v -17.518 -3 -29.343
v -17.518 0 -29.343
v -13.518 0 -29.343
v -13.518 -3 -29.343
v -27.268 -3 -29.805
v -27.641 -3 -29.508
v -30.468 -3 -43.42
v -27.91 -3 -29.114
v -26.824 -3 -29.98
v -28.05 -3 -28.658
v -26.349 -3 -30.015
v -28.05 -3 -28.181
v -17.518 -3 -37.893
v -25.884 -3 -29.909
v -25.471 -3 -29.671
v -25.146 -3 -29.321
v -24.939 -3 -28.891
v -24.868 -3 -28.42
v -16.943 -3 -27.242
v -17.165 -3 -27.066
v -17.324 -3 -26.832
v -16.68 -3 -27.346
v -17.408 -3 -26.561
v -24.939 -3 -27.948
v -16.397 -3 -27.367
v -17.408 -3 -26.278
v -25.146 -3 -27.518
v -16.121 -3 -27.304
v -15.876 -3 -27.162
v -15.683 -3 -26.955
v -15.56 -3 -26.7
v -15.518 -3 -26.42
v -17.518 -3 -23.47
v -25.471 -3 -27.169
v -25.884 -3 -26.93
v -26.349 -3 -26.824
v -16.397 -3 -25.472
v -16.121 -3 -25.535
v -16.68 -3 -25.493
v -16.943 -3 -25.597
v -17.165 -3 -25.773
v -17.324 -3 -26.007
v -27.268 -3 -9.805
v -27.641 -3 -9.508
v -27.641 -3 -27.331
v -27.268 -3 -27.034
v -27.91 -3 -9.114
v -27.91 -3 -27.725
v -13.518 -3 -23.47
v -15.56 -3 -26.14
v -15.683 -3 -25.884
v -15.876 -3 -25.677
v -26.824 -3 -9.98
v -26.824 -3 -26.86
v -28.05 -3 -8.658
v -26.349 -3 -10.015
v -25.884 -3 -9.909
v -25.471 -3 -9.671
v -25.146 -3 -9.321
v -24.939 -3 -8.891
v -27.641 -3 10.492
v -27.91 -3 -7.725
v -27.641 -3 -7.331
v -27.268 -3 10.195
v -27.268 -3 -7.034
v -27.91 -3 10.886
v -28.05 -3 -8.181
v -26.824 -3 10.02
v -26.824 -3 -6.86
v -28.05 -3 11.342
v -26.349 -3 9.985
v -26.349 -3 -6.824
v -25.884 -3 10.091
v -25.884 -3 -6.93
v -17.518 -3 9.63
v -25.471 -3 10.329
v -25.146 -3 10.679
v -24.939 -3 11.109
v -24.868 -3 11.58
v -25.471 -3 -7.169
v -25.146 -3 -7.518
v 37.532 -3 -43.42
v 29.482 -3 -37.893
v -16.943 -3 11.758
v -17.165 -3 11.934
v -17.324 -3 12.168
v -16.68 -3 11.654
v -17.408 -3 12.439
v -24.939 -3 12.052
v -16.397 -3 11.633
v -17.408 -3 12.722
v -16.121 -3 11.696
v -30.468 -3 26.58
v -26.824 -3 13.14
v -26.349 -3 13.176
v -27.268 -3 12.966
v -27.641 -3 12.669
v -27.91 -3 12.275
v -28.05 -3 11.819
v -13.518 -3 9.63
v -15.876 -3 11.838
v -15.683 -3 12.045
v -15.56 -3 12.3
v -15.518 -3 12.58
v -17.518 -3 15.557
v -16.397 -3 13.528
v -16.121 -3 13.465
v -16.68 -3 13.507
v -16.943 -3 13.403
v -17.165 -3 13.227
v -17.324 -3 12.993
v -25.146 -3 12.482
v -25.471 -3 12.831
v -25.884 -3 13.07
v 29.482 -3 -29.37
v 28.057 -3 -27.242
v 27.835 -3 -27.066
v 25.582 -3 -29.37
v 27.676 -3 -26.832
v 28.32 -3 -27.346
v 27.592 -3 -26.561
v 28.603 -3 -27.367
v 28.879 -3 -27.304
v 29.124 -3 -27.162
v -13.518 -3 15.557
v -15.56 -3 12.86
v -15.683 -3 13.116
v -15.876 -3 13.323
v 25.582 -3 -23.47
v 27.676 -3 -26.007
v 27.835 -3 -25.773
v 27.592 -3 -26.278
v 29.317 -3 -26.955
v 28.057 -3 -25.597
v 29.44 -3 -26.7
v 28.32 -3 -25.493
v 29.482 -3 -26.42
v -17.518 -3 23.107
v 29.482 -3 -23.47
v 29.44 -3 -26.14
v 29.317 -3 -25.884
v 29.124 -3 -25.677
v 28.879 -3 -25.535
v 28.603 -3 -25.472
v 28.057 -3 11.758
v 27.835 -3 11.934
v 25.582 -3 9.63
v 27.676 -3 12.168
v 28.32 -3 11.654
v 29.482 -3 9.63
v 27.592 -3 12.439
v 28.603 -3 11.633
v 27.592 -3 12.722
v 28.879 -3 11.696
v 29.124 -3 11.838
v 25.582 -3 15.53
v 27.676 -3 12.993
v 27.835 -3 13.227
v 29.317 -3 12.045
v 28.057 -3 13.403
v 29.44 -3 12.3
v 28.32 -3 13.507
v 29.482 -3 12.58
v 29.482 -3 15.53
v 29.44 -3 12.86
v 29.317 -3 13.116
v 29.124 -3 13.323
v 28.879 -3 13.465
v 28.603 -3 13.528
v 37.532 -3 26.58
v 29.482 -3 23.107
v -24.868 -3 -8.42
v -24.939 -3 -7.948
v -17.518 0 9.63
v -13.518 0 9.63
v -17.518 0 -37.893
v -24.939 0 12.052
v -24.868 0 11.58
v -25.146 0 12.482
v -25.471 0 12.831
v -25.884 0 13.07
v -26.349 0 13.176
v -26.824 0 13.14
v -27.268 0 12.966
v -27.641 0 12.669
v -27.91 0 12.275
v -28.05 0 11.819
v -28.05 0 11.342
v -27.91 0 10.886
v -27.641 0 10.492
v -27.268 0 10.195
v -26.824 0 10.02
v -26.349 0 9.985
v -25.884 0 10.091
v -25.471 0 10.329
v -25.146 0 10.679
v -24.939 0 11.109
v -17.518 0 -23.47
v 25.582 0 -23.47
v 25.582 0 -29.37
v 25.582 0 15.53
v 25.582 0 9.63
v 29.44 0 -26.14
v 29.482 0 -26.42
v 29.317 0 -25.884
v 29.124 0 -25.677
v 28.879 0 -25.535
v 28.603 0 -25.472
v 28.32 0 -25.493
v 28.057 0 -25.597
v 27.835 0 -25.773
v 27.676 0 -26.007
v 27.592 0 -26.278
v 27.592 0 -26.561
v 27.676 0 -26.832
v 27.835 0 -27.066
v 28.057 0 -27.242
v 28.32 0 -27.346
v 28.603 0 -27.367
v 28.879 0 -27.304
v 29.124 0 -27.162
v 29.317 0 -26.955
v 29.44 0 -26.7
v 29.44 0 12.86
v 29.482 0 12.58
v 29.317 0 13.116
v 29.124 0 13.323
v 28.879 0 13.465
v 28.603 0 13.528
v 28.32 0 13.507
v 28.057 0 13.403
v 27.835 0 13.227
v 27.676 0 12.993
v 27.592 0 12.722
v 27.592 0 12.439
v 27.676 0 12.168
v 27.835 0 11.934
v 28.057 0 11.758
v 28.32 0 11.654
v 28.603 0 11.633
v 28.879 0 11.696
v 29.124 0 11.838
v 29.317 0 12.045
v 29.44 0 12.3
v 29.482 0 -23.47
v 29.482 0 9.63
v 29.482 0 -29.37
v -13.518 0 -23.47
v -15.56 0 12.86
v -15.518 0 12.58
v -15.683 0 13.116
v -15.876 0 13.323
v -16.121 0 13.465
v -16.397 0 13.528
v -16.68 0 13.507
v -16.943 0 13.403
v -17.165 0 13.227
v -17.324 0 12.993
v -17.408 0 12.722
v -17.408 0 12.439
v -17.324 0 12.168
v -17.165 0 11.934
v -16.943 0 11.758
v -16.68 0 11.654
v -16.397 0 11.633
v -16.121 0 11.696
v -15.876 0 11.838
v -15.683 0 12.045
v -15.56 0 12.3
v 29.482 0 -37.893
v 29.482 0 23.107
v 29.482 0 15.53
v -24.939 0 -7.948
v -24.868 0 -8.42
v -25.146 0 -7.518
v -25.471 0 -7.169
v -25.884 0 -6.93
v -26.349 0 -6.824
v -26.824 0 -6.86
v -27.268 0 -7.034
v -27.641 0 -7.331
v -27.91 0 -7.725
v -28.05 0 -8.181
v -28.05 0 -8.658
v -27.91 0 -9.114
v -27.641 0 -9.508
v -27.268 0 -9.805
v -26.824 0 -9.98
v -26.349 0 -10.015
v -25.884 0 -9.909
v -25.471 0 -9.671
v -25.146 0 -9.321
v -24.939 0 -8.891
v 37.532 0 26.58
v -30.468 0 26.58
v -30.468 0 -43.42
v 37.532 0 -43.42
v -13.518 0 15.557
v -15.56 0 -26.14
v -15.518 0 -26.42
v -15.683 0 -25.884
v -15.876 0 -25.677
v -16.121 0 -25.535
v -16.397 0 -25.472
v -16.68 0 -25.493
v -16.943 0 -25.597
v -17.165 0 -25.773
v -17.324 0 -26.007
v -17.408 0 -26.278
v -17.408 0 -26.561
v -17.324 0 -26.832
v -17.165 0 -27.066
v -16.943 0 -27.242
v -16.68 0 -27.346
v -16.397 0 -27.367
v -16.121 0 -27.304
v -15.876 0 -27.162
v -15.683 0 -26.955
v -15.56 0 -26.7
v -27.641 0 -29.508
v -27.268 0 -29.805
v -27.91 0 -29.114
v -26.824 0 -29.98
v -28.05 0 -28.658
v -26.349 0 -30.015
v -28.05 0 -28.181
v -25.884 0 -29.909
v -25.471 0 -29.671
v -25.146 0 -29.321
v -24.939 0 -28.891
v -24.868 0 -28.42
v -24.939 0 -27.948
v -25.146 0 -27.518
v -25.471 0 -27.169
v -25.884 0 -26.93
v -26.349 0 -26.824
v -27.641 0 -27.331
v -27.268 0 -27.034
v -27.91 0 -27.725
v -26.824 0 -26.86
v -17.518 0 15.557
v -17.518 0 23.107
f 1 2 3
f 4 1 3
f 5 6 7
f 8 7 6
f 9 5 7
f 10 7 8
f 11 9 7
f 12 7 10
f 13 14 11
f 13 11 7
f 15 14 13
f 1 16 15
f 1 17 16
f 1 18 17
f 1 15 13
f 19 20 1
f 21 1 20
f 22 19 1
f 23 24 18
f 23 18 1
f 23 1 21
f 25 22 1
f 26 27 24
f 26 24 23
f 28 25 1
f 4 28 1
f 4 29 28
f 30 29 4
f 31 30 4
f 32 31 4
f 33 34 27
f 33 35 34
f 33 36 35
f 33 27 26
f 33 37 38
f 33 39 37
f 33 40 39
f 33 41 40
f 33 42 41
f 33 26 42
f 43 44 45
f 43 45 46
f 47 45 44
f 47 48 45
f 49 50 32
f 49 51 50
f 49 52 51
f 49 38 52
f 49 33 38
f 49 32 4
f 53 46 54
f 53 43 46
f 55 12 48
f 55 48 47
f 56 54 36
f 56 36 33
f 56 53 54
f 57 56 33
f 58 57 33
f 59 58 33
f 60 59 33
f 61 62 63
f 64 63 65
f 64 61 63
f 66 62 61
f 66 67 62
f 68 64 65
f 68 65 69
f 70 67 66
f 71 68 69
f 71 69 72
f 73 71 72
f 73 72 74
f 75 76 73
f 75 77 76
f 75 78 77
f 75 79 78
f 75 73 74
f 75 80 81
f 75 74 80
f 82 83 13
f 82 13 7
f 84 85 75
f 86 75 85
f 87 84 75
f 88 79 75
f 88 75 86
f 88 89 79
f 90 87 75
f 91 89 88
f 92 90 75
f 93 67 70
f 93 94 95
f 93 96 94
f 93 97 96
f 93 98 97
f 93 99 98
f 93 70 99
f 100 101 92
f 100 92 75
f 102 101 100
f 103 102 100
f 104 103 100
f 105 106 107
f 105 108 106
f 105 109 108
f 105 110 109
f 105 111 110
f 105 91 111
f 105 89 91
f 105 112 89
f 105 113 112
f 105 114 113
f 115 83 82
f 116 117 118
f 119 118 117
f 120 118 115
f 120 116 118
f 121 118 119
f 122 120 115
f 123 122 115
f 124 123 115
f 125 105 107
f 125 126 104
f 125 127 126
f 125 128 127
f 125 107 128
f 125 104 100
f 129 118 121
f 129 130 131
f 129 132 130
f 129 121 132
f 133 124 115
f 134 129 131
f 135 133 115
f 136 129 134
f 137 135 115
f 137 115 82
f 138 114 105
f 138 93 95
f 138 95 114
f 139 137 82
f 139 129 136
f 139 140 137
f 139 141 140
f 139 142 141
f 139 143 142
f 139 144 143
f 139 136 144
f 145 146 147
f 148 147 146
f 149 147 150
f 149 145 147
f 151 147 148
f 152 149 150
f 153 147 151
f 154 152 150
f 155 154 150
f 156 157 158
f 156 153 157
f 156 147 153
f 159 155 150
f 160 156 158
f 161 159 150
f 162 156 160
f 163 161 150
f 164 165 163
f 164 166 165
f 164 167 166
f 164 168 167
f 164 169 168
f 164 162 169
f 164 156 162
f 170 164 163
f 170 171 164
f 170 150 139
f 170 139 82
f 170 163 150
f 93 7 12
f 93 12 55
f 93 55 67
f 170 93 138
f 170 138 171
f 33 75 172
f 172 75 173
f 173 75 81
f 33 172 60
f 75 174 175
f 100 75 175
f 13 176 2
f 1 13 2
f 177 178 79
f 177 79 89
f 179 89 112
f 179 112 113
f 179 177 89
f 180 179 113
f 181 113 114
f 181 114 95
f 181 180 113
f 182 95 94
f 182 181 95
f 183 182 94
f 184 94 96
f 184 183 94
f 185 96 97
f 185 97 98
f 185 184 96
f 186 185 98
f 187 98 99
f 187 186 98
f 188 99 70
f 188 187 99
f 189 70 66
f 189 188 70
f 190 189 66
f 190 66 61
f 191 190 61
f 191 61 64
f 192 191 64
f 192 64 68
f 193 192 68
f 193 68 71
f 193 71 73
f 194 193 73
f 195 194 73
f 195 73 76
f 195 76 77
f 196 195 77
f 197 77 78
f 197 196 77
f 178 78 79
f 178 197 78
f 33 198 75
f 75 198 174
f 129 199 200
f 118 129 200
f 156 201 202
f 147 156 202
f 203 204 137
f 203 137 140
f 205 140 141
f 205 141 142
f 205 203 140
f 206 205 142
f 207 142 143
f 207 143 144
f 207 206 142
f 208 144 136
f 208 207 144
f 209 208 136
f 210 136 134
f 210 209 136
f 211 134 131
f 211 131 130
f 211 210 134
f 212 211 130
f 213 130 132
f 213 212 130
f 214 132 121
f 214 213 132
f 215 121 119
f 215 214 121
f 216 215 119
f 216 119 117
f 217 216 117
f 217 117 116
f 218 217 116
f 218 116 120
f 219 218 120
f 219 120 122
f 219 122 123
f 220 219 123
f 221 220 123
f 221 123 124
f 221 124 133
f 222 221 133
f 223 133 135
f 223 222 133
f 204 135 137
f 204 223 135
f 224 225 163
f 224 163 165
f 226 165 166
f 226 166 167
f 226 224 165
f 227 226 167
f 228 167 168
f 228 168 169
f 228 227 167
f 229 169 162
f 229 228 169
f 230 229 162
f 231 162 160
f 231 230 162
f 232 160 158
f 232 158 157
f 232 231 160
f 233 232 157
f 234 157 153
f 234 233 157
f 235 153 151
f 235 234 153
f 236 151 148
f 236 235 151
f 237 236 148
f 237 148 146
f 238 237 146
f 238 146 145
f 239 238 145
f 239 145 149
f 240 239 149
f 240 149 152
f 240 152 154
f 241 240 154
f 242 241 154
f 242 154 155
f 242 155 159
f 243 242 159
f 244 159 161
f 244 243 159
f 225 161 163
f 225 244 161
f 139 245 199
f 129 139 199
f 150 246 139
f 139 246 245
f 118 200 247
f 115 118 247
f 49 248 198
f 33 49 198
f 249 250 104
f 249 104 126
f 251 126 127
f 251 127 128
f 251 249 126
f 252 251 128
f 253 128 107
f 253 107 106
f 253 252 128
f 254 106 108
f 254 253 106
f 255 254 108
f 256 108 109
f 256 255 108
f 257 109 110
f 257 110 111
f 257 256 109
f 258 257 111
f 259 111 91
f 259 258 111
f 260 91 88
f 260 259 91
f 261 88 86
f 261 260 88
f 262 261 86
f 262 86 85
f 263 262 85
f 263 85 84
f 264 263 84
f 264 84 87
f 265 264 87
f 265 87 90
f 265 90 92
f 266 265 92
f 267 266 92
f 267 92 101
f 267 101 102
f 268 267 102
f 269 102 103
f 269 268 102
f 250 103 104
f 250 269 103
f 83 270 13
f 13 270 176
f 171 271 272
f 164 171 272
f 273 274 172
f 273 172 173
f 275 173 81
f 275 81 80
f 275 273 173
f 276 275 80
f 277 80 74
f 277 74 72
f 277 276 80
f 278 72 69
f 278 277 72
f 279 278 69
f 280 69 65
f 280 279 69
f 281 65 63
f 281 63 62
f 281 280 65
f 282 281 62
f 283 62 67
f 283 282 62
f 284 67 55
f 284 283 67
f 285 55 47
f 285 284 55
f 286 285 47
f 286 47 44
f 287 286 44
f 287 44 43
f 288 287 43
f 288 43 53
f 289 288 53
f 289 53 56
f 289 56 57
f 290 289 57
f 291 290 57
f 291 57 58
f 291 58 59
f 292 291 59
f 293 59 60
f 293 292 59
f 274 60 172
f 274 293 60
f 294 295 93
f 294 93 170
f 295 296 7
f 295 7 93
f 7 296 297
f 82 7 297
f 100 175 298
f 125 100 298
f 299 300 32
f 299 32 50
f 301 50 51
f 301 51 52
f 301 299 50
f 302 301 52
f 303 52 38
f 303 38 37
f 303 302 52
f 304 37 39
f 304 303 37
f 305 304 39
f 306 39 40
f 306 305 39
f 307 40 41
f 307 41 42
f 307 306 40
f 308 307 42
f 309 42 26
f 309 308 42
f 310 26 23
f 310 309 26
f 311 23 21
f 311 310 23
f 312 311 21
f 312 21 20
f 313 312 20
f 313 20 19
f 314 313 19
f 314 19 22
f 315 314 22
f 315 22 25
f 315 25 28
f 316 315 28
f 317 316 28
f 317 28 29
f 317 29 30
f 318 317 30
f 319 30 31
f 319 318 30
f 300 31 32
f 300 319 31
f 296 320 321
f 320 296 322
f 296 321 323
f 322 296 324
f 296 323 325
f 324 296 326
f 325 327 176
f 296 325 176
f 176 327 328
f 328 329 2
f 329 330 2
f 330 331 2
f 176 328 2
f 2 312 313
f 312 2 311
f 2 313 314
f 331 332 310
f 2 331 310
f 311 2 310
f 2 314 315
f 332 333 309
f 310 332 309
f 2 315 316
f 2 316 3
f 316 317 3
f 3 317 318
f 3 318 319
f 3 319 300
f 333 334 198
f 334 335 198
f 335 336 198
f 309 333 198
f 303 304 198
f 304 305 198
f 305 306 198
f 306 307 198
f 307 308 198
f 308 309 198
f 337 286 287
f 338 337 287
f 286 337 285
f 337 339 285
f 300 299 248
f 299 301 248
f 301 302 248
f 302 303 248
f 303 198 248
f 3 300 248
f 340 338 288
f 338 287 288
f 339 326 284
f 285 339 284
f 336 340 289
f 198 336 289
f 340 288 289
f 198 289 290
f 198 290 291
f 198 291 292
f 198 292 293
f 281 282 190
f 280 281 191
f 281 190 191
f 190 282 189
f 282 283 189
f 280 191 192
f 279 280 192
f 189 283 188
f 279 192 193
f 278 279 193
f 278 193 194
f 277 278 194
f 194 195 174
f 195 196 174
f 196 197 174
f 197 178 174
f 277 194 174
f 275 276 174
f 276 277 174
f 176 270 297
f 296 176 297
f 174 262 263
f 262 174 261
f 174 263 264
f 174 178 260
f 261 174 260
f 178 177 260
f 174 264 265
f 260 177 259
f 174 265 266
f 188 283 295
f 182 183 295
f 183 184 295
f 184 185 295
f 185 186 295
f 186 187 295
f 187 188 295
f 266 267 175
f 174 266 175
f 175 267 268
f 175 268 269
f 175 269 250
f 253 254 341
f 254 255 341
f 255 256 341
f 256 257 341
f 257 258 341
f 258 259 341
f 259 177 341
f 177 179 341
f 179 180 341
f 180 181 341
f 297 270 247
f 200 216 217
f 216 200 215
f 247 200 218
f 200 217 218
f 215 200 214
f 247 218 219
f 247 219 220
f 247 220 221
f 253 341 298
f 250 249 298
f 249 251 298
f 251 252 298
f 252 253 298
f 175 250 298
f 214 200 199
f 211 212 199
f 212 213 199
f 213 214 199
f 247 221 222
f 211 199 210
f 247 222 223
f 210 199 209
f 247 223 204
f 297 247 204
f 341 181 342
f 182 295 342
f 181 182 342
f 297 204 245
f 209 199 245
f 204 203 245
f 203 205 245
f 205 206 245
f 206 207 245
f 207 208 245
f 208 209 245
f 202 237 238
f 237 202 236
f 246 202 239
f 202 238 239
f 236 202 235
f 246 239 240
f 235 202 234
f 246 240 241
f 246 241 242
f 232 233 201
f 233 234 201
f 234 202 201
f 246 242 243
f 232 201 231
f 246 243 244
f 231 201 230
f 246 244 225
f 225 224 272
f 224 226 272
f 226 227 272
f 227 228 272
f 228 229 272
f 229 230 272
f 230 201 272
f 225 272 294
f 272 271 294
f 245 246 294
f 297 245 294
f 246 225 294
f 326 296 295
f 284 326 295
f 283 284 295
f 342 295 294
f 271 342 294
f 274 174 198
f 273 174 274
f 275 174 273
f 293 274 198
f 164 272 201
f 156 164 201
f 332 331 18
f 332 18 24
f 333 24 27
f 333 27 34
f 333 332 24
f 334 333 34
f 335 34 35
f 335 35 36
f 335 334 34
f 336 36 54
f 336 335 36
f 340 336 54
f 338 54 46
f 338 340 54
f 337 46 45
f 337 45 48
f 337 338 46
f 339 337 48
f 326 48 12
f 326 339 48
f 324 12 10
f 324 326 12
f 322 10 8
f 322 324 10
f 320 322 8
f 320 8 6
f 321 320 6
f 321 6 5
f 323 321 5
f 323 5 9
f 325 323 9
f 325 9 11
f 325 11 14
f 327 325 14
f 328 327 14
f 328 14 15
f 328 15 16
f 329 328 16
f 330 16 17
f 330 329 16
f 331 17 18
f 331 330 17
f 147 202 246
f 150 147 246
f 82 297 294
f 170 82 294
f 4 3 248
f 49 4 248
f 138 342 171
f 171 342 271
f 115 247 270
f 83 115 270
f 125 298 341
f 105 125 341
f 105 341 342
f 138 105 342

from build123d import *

# Parameters (mm, degrees)
F0_W     = 68
F0_H     = 70
F0_R     = 1.6
F0_R_2   = 0.95
F1_DEPTH = 3


with BuildPart() as f1:
    # F0 (on Front) → F1 (new body)
    with BuildSketch(Plane.XZ):
        with Locations((3.531757, -8.419635)):
            Rectangle(F0_W, F0_H)
        with Locations((-26.468243, -28.419635)):
            Circle(F0_R, mode=Mode.SUBTRACT)
        with Locations((-16.468243, -26.419635)):
            Circle(F0_R_2, mode=Mode.SUBTRACT)
        with Locations((28.531757, -26.419635)):
            Circle(F0_R_2, mode=Mode.SUBTRACT)
        with Locations((-26.468243, -8.419635)):
            Circle(F0_R, mode=Mode.SUBTRACT)
        with Locations((-26.468243, 11.580365)):
            Circle(F0_R, mode=Mode.SUBTRACT)
        with Locations((-16.468243, 12.580365)):
            Circle(F0_R_2, mode=Mode.SUBTRACT)
        Polygon((-17.518243, 15.556515), (-17.518243, 23.106515), (29.481757, 23.106515), (29.481757, 15.530365), (25.581757, 15.530365), (25.581757, 9.630365), (29.481757, 9.630365), (29.481757, -23.469635), (25.581757, -23.469635), (25.581757, -29.369635), (29.481757, -29.369635), (29.481757, -37.893485), (-17.518243, -37.893485), (-17.518243, -29.343485), (-13.518243, -29.343485), (-13.518243, -23.469635), (-17.518243, -23.469635), (-17.518243, 9.630365), (-13.518243, 9.630365), (-13.518243, 15.556515), align=None, mode=Mode.SUBTRACT)
        with Locations((28.531757, 12.580365)):
            Circle(F0_R_2, mode=Mode.SUBTRACT)
    extrude(amount=F1_DEPTH)


solid = f1.part
